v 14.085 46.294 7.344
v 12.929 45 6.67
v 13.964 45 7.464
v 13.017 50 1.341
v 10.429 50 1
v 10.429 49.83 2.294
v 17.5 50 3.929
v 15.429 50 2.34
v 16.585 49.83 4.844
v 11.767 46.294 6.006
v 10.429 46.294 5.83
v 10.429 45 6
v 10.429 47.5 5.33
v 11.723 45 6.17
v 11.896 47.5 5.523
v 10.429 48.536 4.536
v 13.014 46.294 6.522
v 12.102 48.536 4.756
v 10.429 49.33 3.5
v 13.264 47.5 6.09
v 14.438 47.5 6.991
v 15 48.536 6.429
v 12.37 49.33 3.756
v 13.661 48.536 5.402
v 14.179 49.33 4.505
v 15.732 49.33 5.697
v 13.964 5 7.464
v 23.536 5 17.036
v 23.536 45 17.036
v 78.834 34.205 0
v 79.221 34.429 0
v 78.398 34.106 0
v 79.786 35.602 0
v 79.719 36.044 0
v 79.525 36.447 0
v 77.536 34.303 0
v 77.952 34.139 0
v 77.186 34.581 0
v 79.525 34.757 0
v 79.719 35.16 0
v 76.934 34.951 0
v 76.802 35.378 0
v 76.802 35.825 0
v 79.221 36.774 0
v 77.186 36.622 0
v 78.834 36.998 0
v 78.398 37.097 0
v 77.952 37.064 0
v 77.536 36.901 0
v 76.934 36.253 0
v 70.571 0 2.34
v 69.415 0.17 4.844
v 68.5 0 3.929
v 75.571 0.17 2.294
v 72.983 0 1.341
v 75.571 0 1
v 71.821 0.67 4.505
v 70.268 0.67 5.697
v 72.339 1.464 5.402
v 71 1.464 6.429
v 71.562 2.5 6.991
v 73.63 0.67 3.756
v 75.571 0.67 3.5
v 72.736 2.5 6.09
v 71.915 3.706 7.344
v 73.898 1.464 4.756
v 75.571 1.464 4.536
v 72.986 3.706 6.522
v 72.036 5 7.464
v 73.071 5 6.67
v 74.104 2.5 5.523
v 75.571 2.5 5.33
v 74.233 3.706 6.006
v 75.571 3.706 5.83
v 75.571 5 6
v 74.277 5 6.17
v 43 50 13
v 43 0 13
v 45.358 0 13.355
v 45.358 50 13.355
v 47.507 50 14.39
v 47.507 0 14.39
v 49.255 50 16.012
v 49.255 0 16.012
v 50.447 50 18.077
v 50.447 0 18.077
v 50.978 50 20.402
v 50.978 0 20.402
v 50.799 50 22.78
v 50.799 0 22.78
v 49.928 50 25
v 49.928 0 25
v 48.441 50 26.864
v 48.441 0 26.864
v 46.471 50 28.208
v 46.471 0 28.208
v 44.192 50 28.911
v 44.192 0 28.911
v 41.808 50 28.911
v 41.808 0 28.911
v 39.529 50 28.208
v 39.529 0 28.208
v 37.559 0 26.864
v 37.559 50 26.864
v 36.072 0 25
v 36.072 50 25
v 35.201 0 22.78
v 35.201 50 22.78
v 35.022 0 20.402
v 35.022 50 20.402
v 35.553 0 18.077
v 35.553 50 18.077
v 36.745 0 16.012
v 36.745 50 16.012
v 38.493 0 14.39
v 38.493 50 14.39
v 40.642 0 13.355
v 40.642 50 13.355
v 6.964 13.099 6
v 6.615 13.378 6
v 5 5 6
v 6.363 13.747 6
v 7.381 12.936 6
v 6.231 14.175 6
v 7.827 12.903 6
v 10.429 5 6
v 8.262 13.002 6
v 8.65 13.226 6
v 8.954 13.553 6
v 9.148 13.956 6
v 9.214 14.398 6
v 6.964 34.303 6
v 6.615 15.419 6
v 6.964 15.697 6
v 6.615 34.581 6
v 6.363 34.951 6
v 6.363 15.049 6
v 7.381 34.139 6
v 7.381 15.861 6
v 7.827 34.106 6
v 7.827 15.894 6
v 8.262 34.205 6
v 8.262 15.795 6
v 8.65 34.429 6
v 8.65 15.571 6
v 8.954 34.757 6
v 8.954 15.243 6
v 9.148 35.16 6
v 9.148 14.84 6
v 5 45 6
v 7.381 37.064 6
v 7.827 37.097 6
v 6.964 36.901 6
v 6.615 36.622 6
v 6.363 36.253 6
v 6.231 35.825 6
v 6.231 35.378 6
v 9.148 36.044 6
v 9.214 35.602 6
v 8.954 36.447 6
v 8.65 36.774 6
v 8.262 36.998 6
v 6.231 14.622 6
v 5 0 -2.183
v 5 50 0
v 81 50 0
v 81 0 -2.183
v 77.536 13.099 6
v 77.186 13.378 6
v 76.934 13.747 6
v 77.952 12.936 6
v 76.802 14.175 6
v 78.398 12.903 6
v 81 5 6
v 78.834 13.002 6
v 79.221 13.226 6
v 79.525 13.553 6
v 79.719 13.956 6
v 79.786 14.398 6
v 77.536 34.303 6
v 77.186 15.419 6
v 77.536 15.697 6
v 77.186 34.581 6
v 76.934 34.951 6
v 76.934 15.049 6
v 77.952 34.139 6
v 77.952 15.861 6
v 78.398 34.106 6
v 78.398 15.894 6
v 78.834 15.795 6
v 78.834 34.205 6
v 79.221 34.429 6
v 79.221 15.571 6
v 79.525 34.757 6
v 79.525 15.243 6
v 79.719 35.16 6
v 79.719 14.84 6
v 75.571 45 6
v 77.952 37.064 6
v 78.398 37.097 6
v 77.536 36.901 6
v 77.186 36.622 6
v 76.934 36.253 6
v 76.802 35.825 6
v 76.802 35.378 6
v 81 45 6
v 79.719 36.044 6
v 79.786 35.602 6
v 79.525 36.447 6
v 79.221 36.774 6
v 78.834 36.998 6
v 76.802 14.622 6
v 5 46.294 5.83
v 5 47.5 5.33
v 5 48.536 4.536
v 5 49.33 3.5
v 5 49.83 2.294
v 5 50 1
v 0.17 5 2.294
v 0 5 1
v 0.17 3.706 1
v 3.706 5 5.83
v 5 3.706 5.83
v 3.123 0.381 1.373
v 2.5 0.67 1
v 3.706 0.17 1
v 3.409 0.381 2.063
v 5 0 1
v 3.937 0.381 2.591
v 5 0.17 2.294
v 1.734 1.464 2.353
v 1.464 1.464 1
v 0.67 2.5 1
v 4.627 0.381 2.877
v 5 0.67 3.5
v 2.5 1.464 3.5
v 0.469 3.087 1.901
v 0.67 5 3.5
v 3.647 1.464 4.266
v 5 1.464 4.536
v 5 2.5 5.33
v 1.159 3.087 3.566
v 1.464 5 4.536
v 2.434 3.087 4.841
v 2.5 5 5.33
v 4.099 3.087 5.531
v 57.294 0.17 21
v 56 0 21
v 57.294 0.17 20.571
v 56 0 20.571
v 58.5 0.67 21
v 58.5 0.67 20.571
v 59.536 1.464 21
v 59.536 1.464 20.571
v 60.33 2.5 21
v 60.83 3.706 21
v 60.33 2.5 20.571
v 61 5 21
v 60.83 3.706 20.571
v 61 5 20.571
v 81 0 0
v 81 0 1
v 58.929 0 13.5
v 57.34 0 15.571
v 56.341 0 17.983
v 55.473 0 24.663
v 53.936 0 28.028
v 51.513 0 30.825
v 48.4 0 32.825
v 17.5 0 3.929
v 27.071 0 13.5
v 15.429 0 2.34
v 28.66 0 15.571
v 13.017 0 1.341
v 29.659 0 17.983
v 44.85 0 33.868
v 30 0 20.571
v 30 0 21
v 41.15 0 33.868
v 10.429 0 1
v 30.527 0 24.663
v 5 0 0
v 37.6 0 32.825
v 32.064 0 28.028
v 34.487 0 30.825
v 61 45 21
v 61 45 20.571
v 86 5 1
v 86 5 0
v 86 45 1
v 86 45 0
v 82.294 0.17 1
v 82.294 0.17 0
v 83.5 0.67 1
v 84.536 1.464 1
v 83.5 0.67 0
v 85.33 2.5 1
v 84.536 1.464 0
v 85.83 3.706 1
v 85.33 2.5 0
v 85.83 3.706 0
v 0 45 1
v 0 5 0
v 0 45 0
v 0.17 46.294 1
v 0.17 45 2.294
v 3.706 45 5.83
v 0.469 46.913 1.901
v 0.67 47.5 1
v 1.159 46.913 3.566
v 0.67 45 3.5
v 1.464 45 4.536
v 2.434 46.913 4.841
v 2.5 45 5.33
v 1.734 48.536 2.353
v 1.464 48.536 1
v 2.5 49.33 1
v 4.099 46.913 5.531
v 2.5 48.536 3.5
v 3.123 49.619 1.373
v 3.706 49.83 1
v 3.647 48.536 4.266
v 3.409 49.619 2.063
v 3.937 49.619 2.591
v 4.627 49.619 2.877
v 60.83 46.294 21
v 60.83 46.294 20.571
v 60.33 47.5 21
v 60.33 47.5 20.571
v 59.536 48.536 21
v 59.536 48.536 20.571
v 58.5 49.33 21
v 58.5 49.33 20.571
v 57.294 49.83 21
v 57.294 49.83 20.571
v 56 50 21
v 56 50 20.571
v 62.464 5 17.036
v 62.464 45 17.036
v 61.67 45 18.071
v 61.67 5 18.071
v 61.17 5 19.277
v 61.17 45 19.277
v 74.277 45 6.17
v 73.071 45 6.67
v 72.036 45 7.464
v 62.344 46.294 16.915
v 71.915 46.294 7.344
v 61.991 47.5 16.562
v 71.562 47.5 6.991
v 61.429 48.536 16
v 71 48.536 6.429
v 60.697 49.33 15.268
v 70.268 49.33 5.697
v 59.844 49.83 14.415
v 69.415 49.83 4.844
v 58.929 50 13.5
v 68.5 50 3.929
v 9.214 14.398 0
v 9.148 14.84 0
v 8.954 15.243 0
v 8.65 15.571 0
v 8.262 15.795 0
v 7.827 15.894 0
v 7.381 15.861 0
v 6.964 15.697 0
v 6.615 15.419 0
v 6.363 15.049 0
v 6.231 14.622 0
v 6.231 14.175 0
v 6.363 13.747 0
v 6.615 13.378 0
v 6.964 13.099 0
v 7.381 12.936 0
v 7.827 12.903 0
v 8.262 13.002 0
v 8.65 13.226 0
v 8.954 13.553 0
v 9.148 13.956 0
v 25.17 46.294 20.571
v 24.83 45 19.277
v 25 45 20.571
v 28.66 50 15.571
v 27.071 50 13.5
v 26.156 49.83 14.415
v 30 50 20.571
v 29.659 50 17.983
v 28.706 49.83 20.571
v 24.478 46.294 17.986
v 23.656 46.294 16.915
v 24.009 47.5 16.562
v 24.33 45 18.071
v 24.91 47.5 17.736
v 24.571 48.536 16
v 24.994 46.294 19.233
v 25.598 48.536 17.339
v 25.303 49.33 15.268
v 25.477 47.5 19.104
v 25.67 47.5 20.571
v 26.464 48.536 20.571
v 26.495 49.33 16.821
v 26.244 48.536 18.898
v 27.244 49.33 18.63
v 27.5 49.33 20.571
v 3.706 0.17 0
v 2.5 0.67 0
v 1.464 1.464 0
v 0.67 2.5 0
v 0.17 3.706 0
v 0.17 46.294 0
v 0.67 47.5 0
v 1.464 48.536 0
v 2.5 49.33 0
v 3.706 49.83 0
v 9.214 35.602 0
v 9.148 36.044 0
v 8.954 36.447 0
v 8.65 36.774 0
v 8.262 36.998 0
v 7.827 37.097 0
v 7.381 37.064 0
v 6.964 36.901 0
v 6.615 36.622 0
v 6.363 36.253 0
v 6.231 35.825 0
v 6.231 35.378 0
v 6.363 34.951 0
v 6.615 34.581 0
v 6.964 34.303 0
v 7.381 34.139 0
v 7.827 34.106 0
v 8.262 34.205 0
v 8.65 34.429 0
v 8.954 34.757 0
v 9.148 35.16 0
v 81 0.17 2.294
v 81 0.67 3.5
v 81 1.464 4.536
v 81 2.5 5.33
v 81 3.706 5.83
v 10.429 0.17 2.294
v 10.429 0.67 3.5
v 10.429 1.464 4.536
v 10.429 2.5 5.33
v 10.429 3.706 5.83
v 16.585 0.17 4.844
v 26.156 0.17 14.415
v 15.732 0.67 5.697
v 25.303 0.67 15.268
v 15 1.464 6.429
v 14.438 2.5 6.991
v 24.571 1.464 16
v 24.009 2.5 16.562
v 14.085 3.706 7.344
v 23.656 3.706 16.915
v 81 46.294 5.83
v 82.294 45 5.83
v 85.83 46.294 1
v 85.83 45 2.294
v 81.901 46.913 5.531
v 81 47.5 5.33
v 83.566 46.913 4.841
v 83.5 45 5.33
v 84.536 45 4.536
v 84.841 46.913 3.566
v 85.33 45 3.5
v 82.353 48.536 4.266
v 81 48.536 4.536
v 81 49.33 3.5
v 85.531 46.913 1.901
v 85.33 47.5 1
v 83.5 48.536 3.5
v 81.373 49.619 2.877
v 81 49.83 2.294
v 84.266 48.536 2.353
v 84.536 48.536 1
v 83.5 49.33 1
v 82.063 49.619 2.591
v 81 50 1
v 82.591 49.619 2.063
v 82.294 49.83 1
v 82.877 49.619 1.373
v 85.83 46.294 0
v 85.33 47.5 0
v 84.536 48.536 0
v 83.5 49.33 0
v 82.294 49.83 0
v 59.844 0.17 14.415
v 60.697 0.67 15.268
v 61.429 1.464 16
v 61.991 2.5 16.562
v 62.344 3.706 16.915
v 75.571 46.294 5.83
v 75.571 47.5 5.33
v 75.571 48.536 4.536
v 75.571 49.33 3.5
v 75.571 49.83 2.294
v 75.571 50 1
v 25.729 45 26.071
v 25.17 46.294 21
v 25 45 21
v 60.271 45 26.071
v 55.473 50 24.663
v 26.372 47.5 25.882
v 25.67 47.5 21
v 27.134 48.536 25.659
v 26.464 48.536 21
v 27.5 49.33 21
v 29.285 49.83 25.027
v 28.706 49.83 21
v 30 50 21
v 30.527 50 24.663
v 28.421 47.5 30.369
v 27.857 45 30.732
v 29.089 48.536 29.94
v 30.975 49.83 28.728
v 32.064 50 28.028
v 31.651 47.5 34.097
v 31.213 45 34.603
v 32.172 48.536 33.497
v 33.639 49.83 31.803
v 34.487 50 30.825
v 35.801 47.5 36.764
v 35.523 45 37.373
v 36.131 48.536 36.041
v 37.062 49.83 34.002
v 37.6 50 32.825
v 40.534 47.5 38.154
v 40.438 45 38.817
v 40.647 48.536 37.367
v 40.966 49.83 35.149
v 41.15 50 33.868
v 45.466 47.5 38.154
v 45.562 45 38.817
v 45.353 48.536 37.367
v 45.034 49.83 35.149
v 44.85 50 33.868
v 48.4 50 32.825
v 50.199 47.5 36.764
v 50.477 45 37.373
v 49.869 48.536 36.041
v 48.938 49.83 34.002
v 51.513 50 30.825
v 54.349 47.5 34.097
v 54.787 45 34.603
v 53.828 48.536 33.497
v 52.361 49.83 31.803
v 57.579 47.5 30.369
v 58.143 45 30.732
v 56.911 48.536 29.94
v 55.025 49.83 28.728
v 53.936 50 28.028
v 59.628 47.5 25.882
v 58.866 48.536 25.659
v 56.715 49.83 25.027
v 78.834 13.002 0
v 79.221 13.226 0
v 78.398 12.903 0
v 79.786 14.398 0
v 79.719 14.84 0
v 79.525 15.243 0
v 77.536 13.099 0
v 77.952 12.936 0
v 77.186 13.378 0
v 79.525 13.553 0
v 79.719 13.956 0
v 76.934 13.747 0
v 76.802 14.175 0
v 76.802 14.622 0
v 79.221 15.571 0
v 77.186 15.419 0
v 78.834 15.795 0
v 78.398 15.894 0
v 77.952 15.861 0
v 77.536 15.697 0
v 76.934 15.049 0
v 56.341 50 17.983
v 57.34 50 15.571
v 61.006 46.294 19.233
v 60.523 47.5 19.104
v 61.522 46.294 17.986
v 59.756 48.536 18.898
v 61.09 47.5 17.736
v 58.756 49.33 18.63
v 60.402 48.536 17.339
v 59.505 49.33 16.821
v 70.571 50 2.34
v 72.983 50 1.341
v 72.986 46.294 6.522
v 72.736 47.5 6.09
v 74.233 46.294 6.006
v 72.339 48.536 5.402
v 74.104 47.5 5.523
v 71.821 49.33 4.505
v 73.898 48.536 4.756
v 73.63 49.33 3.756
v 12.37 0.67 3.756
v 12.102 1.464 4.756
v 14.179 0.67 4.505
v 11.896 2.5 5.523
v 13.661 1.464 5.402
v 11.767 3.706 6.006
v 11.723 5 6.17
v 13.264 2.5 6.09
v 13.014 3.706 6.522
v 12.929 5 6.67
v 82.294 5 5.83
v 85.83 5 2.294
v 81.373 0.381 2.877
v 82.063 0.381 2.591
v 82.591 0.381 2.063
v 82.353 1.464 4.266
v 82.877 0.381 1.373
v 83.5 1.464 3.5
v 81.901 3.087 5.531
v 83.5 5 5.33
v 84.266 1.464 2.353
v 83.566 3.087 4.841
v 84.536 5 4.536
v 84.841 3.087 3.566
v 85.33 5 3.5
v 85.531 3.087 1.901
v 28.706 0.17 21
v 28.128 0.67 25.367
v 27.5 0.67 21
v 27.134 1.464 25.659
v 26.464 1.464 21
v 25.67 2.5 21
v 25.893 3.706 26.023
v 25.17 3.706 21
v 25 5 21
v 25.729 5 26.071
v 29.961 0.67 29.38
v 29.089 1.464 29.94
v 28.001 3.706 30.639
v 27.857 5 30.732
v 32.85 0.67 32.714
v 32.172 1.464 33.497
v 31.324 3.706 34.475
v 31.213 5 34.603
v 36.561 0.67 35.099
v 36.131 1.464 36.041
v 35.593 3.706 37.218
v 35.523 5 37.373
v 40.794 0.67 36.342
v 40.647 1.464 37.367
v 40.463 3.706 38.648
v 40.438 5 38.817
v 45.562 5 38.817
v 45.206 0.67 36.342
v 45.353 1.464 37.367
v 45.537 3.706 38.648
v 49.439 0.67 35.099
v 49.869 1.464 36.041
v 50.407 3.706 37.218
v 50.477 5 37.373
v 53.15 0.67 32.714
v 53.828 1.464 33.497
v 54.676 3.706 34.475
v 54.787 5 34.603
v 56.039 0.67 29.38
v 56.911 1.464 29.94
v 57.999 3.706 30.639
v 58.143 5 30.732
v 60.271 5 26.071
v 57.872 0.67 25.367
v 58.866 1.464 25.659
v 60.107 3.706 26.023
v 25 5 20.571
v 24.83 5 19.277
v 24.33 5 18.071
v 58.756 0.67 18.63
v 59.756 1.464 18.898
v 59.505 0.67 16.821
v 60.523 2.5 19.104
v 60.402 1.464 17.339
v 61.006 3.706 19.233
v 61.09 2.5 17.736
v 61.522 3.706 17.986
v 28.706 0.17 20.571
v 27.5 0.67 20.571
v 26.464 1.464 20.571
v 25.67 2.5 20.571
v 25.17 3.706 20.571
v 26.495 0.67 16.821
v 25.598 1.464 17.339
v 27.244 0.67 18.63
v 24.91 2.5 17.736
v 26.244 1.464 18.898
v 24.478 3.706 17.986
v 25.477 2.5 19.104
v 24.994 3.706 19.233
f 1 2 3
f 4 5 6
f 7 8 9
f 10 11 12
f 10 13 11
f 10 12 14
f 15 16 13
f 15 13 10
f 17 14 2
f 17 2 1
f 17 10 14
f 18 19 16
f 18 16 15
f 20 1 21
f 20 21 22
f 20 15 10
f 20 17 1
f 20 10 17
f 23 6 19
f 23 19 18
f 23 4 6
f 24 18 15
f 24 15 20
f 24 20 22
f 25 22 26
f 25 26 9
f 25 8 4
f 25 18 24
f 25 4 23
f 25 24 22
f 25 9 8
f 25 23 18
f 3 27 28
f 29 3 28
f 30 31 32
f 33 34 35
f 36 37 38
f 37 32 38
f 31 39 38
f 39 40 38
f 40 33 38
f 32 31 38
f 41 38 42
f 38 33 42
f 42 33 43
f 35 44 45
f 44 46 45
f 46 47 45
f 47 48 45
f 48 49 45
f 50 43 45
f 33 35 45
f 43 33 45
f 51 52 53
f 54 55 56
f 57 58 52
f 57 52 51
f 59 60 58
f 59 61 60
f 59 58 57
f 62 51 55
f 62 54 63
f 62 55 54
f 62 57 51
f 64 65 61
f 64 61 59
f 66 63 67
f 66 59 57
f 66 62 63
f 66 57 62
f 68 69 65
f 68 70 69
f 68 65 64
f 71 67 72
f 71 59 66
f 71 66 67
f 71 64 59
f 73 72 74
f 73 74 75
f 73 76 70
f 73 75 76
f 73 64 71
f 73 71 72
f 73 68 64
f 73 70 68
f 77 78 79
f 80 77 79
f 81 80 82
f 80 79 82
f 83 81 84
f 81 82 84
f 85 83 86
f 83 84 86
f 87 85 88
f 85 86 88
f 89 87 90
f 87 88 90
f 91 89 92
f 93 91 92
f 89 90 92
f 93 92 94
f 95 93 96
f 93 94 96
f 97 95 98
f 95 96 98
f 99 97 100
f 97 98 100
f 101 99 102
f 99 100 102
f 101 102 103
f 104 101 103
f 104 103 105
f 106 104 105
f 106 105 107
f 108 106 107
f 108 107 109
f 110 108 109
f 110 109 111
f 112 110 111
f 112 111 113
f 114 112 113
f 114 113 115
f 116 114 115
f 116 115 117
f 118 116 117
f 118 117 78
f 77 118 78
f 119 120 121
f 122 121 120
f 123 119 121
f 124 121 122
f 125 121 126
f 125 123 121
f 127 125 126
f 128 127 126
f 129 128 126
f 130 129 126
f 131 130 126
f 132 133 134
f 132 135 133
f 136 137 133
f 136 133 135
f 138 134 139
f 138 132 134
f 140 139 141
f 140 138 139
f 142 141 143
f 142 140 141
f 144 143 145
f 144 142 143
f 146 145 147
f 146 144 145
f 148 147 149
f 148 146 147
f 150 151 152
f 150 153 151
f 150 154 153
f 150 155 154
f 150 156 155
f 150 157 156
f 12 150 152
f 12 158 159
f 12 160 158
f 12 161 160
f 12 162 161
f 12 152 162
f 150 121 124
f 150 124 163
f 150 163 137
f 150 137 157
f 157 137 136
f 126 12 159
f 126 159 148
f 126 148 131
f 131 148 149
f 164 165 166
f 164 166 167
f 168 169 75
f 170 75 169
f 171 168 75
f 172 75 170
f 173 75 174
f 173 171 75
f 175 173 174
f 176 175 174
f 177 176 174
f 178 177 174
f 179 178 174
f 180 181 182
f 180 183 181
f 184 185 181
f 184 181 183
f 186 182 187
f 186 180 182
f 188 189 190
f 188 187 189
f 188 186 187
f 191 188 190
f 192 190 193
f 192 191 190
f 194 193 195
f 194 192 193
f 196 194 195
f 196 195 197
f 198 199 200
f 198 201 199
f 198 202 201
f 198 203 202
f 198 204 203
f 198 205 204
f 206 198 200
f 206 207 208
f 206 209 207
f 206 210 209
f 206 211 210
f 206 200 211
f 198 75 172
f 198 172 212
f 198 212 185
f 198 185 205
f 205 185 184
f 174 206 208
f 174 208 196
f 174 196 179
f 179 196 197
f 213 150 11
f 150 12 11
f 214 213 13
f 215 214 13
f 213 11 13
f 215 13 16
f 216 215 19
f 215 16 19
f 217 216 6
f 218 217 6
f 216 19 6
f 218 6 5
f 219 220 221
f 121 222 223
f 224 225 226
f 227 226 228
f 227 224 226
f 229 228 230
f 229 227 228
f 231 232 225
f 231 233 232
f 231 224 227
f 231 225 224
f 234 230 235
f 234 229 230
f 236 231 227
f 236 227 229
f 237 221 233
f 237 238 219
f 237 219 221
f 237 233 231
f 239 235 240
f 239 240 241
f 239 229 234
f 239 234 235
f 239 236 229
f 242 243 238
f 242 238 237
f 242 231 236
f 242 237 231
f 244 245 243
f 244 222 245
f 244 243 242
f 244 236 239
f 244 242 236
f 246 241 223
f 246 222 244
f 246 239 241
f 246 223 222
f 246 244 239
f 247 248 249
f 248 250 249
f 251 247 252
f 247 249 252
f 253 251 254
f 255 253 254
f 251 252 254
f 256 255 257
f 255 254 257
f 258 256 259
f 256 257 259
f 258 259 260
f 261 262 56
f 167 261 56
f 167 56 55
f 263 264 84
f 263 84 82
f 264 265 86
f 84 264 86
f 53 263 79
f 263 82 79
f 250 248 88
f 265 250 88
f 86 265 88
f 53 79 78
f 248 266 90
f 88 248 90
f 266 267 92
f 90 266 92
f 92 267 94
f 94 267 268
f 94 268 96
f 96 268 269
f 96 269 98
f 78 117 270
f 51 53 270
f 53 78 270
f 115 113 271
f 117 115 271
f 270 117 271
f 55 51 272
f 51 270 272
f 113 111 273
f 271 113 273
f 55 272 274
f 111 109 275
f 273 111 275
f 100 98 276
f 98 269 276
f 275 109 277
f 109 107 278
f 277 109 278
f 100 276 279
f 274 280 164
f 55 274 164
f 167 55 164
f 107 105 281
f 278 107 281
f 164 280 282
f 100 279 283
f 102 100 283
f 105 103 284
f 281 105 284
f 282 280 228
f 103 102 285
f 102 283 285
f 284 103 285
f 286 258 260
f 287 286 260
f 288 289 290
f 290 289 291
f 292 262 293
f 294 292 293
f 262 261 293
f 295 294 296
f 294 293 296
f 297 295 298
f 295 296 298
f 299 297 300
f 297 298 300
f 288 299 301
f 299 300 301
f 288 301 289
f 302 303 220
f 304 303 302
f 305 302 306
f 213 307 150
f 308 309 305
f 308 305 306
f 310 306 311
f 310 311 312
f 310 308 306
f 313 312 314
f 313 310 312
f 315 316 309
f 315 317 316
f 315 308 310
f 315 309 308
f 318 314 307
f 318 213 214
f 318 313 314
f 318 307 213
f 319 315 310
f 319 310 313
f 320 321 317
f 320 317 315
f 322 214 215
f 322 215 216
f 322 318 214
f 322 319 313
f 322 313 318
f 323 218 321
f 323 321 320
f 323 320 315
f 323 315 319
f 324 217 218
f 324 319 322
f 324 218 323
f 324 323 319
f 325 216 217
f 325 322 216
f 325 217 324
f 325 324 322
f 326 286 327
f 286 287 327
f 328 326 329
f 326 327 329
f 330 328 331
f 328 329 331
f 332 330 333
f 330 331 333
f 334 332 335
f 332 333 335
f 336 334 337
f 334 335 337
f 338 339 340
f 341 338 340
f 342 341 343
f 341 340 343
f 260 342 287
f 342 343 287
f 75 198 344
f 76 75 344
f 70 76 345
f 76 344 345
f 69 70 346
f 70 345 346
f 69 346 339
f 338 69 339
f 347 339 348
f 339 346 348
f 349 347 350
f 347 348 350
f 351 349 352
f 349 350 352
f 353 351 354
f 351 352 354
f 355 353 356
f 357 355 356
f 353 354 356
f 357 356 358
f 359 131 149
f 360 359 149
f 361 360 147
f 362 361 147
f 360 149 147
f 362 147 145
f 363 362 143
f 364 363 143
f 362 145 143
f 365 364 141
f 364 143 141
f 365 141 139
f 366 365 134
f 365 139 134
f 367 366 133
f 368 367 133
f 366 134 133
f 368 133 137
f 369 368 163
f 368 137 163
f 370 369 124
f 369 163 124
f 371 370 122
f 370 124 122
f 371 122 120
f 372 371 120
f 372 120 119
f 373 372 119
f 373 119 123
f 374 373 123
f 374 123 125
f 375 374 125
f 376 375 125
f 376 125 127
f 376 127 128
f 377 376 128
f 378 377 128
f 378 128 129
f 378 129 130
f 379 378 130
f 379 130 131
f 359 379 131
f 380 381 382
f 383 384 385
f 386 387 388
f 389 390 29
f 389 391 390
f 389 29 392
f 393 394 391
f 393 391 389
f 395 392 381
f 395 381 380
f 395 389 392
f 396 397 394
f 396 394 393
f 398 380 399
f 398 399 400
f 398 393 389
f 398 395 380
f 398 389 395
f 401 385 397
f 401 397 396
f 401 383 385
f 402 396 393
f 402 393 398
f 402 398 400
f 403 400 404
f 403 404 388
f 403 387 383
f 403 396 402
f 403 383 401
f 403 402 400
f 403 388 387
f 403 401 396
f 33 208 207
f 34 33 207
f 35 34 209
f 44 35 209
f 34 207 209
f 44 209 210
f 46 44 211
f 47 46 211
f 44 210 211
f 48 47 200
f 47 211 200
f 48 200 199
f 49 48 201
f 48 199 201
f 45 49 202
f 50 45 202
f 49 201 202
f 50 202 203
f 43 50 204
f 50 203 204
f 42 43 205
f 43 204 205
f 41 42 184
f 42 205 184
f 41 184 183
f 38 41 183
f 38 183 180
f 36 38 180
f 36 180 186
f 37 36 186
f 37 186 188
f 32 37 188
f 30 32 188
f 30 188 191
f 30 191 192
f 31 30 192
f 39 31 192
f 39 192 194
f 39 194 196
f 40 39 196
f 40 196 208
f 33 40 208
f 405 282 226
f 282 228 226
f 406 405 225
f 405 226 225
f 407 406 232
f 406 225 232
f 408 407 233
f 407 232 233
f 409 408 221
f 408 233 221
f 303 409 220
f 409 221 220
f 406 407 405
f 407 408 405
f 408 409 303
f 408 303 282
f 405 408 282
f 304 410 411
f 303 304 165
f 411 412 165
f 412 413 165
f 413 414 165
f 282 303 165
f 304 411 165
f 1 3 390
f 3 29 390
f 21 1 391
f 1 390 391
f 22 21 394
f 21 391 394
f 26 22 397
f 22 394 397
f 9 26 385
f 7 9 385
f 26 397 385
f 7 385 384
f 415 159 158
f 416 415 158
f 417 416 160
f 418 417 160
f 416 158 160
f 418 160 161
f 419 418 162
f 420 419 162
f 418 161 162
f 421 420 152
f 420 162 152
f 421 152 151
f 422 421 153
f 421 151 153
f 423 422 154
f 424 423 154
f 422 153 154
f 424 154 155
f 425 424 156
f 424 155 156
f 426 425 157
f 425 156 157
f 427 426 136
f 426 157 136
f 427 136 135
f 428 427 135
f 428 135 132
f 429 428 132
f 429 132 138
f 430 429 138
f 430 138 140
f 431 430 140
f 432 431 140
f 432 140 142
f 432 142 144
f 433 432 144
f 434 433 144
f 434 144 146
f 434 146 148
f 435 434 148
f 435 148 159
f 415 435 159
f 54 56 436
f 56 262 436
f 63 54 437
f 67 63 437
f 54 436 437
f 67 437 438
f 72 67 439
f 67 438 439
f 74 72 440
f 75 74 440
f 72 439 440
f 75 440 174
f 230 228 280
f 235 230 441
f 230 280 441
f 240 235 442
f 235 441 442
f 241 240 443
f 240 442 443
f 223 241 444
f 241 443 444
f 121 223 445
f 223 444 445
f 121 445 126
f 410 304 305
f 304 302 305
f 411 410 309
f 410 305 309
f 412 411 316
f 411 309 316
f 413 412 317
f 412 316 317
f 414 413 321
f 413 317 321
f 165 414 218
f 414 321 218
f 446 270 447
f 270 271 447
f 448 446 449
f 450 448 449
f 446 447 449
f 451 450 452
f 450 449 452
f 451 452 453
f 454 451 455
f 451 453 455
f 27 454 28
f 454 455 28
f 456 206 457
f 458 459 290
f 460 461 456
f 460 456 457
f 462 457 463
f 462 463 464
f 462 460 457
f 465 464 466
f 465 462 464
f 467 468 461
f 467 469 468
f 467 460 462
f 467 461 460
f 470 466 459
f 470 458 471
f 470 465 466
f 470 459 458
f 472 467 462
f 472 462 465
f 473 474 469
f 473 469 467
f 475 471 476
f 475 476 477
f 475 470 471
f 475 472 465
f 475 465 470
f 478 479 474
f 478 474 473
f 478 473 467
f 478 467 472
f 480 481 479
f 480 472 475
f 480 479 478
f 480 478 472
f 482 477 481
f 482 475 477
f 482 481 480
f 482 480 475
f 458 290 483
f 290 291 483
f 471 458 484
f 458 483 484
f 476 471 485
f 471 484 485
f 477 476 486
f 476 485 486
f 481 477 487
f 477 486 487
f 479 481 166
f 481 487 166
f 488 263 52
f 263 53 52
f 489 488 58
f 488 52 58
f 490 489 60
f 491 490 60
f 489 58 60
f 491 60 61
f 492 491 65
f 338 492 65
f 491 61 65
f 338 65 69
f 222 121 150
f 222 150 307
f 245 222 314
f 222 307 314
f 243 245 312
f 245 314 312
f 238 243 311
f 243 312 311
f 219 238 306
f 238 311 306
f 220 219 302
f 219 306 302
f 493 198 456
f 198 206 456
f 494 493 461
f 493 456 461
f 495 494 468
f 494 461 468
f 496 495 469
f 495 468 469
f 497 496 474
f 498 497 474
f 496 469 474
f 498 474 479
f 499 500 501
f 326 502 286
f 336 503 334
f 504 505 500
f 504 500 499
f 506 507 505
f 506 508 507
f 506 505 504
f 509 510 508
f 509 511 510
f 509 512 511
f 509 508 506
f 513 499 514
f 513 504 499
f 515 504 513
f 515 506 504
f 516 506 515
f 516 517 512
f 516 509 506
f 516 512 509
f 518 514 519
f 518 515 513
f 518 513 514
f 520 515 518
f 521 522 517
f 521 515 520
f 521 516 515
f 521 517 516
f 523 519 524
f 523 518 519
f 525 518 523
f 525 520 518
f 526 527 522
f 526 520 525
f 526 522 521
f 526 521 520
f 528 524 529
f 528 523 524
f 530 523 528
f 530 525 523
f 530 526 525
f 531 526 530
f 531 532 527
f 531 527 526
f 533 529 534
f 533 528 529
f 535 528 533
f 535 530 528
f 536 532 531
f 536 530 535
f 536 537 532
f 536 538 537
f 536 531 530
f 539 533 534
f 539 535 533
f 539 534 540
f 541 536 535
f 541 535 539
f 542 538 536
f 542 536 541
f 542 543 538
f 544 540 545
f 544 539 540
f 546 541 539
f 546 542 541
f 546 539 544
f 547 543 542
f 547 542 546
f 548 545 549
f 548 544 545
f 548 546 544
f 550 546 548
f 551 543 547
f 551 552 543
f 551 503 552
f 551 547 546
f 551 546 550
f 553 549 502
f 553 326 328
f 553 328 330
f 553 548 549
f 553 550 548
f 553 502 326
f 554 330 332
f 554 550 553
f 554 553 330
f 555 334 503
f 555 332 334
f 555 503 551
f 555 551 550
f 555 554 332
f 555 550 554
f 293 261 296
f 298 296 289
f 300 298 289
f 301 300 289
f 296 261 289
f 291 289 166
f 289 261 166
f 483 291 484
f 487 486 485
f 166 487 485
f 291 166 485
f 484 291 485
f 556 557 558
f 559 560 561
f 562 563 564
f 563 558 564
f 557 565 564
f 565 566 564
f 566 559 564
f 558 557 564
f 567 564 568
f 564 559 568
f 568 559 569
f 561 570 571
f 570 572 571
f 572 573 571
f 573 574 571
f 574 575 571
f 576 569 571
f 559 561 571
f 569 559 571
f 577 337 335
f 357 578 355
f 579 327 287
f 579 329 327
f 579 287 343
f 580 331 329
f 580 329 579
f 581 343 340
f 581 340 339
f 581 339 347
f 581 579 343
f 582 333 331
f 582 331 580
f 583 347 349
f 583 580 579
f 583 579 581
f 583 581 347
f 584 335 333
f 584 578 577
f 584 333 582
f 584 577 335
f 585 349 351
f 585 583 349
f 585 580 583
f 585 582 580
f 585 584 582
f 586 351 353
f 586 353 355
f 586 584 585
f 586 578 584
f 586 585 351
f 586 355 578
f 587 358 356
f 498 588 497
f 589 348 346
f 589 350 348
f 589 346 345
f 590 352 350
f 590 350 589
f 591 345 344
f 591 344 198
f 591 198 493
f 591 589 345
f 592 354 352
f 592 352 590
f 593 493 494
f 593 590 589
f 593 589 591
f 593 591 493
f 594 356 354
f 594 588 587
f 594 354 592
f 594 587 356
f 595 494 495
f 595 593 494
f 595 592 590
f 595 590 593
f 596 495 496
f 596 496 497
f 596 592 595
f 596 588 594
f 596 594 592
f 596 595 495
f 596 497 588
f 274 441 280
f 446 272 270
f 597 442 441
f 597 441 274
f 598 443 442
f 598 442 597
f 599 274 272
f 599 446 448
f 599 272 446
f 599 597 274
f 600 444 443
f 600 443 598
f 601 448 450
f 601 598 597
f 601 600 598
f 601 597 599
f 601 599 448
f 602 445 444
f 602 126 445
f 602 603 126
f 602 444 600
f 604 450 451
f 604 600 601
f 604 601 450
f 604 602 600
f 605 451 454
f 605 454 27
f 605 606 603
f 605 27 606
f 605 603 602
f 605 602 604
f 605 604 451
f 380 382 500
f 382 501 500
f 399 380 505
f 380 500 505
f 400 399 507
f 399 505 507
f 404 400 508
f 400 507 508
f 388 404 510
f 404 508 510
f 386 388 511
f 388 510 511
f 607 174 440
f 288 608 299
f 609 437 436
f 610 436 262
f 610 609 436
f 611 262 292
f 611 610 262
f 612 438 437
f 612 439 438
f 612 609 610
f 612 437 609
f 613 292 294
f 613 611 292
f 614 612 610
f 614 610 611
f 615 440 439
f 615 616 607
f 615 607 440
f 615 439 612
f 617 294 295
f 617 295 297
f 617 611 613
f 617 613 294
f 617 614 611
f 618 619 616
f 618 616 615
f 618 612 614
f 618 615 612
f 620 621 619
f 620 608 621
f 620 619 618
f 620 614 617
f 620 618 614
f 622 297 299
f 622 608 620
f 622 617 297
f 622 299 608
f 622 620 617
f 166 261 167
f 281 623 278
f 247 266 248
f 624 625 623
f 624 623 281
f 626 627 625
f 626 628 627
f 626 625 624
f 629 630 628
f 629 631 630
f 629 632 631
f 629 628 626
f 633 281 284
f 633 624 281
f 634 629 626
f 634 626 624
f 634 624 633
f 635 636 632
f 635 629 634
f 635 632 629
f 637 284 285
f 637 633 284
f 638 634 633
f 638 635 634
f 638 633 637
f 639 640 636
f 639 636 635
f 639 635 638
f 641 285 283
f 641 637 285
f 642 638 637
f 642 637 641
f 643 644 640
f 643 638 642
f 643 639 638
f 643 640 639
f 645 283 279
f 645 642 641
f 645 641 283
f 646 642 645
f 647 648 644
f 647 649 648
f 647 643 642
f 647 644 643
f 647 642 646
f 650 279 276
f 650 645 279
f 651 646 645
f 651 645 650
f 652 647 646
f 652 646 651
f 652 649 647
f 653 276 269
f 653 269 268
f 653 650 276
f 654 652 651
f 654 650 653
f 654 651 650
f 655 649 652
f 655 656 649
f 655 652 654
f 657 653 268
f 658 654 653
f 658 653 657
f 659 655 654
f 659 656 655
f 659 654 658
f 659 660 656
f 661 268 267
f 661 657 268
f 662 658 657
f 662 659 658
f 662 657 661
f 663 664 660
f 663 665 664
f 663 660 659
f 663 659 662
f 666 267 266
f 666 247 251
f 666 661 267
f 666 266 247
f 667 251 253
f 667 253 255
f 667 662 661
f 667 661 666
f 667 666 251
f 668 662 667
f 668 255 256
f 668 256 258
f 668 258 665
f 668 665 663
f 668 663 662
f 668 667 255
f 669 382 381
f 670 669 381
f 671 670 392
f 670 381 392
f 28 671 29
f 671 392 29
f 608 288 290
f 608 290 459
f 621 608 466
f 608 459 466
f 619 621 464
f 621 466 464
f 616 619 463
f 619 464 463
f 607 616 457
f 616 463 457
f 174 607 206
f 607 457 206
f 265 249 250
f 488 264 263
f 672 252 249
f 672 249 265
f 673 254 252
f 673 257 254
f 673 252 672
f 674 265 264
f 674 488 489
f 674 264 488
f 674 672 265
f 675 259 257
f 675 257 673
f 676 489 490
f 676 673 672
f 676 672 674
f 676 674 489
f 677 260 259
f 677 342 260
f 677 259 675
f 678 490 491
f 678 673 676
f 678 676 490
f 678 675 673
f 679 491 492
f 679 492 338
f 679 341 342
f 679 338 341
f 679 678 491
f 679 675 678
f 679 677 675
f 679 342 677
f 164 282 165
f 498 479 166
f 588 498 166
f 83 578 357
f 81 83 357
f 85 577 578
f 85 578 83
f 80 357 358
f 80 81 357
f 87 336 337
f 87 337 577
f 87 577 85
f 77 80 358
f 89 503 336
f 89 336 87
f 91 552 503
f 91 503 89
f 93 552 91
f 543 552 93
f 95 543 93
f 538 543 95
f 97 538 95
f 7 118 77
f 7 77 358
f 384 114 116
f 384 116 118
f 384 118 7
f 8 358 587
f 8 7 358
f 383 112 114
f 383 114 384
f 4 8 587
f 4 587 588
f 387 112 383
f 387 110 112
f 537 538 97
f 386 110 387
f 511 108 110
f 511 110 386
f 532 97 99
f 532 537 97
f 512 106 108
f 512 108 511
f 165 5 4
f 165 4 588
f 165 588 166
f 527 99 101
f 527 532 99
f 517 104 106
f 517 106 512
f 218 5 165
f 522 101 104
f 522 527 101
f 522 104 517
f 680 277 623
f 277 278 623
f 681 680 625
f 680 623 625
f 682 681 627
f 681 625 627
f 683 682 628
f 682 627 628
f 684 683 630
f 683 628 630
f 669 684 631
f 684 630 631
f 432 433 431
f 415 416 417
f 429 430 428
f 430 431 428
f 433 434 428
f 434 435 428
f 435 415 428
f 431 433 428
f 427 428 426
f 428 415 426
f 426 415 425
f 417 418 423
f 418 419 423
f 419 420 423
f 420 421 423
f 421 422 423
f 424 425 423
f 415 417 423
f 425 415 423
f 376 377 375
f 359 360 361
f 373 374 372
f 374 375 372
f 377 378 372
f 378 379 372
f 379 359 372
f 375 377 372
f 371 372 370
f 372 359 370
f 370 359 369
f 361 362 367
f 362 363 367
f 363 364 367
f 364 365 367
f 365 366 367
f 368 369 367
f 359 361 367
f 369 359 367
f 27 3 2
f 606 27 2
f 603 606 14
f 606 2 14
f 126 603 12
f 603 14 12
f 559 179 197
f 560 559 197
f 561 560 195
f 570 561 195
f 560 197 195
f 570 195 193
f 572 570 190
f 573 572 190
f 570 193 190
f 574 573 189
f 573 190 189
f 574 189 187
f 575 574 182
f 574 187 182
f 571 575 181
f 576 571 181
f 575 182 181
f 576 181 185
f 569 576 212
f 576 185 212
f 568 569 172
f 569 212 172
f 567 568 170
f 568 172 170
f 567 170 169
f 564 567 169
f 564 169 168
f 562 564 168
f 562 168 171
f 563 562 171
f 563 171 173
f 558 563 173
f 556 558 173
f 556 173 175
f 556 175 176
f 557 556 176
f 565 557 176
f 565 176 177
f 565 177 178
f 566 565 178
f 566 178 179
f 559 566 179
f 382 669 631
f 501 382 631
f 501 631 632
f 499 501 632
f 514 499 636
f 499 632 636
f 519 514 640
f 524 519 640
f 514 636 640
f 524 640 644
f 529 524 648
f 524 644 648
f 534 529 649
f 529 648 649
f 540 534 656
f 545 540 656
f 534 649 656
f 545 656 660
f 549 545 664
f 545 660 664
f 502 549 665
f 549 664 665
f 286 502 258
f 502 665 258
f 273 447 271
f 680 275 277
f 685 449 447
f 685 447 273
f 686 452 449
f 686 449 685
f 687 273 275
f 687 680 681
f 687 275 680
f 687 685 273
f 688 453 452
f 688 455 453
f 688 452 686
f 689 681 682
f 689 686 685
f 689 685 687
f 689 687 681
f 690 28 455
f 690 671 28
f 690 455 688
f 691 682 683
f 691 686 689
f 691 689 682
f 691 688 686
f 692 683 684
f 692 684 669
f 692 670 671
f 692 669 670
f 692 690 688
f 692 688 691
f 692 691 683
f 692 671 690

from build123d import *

# Parameters (mm, degrees)
SKETCH1_W           = 86
SKETCH1_H           = 50
BOSS_EXTRUDE2_DEPTH = 6
BOSS_EXTRUDE3_DEPTH = 50
SKETCH4_R           = 8
CUT_EXTRUDE1_DEPTH  = 121
BOSS_EXTRUDE5_DEPTH = 50
BOSS_EXTRUDE6_DEPTH = 50
FILLET1_R           = 5
FILLET2_R           = 5
FILLET3_R           = 5
FILLET4_R           = 5
FILLET5_R           = 5
SKETCH7_R           = 1.5
CUT_EXTRUDE2_DEPTH  = 50
SKETCH8_R           = 1.5
CUT_EXTRUDE4_DEPTH  = 50
SKETCH9_W           = 76
SKETCH9_H           = 50
BOSS_EXTRUDE7_DEPTH = 5
CUT_EXTRUDE5_DEPTH  = 121


with BuildPart() as part:
    # Sketch1 → Boss-Extrude2 (new body)
    with BuildSketch(Plane.XY):
        with Locations((43, 25)):
            Rectangle(SKETCH1_W, SKETCH1_H)
    extrude(amount=BOSS_EXTRUDE2_DEPTH)

    # Sketch2 → Boss-Extrude3 (add)
    with BuildSketch(Plane(origin=(0, 0, 0), x_dir=(-1, 0, 0), z_dir=(0, -1, 0))):
        with BuildLine():
            Line((-61, -21), (-61, -6))
            Line((-61, -6), (-25, -6))
            Line((-25, -6), (-25, -21))
            ThreePointArc((-25, -21), (-43, -39), (-61, -21))
        make_face()
    extrude(amount=-BOSS_EXTRUDE3_DEPTH)

    # Sketch4 → Cut-Extrude1 (cut)
    with BuildSketch(Plane(origin=(0, 0, 0), x_dir=(-1, 0, 0), z_dir=(0, -1, 0))):
        with Locations(Location((-43, -21, 0), (0, 0, 90))):
            Circle(SKETCH4_R)
    extrude(amount=-CUT_EXTRUDE1_DEPTH, mode=Mode.SUBTRACT)

    # Sketch5 → Boss-Extrude5 (add)
    with BuildSketch(Plane(origin=(0, 0, 0), x_dir=(-1, 0, 0), z_dir=(0, -1, 0))):
        Polygon((-61, -6), (-73.5, -6), (-61, -18.5), align=None)
    extrude(amount=-BOSS_EXTRUDE5_DEPTH)

    # Sketch6 → Boss-Extrude6 (add)
    with BuildSketch(Plane(origin=(0, 0, 0), x_dir=(-1, 0, 0), z_dir=(0, -1, 0))):
        Polygon((-25, -6), (-12.5, -6), (-25, -18.5), align=None)
    extrude(amount=-BOSS_EXTRUDE6_DEPTH)

    # Fillet1
    fillet1_edges = [part.edges().sort_by_distance(p)[0] for p in [
        (86, 25, 6),
    ]]
    fillet(fillet1_edges, radius=FILLET1_R)

    # Fillet2
    fillet2_edges = [part.edges().sort_by_distance(p)[0] for p in [
        (73.5, 25, 6),
    ]]
    fillet(fillet2_edges, radius=FILLET2_R)

    # Fillet3
    fillet3_edges = [part.edges().sort_by_distance(p)[0] for p in [
        (61, 25, 18.5),
    ]]
    fillet(fillet3_edges, radius=FILLET3_R)

    # Fillet4
    fillet4_edges = [part.edges().sort_by_distance(p)[0] for p in [
        (25, 25, 18.5),
        (0, 25, 6),
        (12.5, 25, 6),
    ]]
    fillet(fillet4_edges, radius=FILLET4_R)

    # Fillet5
    fillet5_edges = [part.edges().sort_by_distance(p)[0] for p in [
        (43, 0, 39),
        (61, 0, 20.785533906),
        (43, 50, 39),
        (61, 50, 20.785533906),
        (78.285533906, 50, 6),
        (86, 50, 0.5),
        (84.535533906, 50, 4.535533906),
        (86, 0, 0.5),
        (84.535533906, 0, 4.535533906),
        (78.285533906, 0, 6),
        (67.25, 0, 12.25),
        (67.25, 50, 12.25),
        (73.65765065, 0, 6.380602337),
        (73.65765065, 50, 6.380602337),
        (61.380602337, 0, 18.65765065),
        (61.380602337, 50, 18.65765065),
        (18.75, 0, 12.25),
        (18.75, 50, 12.25),
        (7.714466094, 50, 6),
        (7.714466094, 0, 6),
        (25, 50, 20.785533906),
        (25, 0, 20.785533906),
        (0, 0, 0.5),
        (1.464466094, 0, 4.535533906),
        (0, 50, 0.5),
        (1.464466094, 50, 4.535533906),
        (12.34234935, 0, 6.380602337),
        (12.34234935, 50, 6.380602337),
        (24.619397663, 0, 18.65765065),
        (24.619397663, 50, 18.65765065),
    ]]
    fillet(fillet5_edges, radius=FILLET5_R)

    # Sketch7 → Cut-Extrude2 (cut)
    with BuildSketch(Plane.XY.offset(6)):
        with Locations((7.714466094, 35.601677871)):
            Circle(SKETCH7_R)
        with Locations((7.714466094, 14.398322129)):
            Circle(SKETCH7_R)
    extrude(amount=-CUT_EXTRUDE2_DEPTH, mode=Mode.SUBTRACT)

    # Sketch8 → Cut-Extrude4 (cut)
    with BuildSketch(Plane.XY.offset(6)):
        with Locations((78.285533906, 35.60168)):
            Circle(SKETCH8_R)
        with Locations((78.285533906, 14.39832)):
            Circle(SKETCH8_R)
    extrude(amount=-CUT_EXTRUDE4_DEPTH, mode=Mode.SUBTRACT)

    # Sketch9 → Boss-Extrude7 (add)
    with BuildSketch(Plane(origin=(0, 0, 0), x_dir=(-1, 0, 0), z_dir=(0, 0, -1))):
        with Locations((-43, 25)):
            Rectangle(SKETCH9_W, SKETCH9_H)
    extrude(amount=BOSS_EXTRUDE7_DEPTH)

    # Sketch11 → Cut-Extrude5 (cut)
    with BuildSketch(Plane.ZY.offset(-5)):
        Polygon((0, 50), (-2.260657521, -1.777569844), (-5.022686567, -1.777569844), (-5, 50), align=None)
    extrude(amount=-CUT_EXTRUDE5_DEPTH, mode=Mode.SUBTRACT)


solid = part.part
